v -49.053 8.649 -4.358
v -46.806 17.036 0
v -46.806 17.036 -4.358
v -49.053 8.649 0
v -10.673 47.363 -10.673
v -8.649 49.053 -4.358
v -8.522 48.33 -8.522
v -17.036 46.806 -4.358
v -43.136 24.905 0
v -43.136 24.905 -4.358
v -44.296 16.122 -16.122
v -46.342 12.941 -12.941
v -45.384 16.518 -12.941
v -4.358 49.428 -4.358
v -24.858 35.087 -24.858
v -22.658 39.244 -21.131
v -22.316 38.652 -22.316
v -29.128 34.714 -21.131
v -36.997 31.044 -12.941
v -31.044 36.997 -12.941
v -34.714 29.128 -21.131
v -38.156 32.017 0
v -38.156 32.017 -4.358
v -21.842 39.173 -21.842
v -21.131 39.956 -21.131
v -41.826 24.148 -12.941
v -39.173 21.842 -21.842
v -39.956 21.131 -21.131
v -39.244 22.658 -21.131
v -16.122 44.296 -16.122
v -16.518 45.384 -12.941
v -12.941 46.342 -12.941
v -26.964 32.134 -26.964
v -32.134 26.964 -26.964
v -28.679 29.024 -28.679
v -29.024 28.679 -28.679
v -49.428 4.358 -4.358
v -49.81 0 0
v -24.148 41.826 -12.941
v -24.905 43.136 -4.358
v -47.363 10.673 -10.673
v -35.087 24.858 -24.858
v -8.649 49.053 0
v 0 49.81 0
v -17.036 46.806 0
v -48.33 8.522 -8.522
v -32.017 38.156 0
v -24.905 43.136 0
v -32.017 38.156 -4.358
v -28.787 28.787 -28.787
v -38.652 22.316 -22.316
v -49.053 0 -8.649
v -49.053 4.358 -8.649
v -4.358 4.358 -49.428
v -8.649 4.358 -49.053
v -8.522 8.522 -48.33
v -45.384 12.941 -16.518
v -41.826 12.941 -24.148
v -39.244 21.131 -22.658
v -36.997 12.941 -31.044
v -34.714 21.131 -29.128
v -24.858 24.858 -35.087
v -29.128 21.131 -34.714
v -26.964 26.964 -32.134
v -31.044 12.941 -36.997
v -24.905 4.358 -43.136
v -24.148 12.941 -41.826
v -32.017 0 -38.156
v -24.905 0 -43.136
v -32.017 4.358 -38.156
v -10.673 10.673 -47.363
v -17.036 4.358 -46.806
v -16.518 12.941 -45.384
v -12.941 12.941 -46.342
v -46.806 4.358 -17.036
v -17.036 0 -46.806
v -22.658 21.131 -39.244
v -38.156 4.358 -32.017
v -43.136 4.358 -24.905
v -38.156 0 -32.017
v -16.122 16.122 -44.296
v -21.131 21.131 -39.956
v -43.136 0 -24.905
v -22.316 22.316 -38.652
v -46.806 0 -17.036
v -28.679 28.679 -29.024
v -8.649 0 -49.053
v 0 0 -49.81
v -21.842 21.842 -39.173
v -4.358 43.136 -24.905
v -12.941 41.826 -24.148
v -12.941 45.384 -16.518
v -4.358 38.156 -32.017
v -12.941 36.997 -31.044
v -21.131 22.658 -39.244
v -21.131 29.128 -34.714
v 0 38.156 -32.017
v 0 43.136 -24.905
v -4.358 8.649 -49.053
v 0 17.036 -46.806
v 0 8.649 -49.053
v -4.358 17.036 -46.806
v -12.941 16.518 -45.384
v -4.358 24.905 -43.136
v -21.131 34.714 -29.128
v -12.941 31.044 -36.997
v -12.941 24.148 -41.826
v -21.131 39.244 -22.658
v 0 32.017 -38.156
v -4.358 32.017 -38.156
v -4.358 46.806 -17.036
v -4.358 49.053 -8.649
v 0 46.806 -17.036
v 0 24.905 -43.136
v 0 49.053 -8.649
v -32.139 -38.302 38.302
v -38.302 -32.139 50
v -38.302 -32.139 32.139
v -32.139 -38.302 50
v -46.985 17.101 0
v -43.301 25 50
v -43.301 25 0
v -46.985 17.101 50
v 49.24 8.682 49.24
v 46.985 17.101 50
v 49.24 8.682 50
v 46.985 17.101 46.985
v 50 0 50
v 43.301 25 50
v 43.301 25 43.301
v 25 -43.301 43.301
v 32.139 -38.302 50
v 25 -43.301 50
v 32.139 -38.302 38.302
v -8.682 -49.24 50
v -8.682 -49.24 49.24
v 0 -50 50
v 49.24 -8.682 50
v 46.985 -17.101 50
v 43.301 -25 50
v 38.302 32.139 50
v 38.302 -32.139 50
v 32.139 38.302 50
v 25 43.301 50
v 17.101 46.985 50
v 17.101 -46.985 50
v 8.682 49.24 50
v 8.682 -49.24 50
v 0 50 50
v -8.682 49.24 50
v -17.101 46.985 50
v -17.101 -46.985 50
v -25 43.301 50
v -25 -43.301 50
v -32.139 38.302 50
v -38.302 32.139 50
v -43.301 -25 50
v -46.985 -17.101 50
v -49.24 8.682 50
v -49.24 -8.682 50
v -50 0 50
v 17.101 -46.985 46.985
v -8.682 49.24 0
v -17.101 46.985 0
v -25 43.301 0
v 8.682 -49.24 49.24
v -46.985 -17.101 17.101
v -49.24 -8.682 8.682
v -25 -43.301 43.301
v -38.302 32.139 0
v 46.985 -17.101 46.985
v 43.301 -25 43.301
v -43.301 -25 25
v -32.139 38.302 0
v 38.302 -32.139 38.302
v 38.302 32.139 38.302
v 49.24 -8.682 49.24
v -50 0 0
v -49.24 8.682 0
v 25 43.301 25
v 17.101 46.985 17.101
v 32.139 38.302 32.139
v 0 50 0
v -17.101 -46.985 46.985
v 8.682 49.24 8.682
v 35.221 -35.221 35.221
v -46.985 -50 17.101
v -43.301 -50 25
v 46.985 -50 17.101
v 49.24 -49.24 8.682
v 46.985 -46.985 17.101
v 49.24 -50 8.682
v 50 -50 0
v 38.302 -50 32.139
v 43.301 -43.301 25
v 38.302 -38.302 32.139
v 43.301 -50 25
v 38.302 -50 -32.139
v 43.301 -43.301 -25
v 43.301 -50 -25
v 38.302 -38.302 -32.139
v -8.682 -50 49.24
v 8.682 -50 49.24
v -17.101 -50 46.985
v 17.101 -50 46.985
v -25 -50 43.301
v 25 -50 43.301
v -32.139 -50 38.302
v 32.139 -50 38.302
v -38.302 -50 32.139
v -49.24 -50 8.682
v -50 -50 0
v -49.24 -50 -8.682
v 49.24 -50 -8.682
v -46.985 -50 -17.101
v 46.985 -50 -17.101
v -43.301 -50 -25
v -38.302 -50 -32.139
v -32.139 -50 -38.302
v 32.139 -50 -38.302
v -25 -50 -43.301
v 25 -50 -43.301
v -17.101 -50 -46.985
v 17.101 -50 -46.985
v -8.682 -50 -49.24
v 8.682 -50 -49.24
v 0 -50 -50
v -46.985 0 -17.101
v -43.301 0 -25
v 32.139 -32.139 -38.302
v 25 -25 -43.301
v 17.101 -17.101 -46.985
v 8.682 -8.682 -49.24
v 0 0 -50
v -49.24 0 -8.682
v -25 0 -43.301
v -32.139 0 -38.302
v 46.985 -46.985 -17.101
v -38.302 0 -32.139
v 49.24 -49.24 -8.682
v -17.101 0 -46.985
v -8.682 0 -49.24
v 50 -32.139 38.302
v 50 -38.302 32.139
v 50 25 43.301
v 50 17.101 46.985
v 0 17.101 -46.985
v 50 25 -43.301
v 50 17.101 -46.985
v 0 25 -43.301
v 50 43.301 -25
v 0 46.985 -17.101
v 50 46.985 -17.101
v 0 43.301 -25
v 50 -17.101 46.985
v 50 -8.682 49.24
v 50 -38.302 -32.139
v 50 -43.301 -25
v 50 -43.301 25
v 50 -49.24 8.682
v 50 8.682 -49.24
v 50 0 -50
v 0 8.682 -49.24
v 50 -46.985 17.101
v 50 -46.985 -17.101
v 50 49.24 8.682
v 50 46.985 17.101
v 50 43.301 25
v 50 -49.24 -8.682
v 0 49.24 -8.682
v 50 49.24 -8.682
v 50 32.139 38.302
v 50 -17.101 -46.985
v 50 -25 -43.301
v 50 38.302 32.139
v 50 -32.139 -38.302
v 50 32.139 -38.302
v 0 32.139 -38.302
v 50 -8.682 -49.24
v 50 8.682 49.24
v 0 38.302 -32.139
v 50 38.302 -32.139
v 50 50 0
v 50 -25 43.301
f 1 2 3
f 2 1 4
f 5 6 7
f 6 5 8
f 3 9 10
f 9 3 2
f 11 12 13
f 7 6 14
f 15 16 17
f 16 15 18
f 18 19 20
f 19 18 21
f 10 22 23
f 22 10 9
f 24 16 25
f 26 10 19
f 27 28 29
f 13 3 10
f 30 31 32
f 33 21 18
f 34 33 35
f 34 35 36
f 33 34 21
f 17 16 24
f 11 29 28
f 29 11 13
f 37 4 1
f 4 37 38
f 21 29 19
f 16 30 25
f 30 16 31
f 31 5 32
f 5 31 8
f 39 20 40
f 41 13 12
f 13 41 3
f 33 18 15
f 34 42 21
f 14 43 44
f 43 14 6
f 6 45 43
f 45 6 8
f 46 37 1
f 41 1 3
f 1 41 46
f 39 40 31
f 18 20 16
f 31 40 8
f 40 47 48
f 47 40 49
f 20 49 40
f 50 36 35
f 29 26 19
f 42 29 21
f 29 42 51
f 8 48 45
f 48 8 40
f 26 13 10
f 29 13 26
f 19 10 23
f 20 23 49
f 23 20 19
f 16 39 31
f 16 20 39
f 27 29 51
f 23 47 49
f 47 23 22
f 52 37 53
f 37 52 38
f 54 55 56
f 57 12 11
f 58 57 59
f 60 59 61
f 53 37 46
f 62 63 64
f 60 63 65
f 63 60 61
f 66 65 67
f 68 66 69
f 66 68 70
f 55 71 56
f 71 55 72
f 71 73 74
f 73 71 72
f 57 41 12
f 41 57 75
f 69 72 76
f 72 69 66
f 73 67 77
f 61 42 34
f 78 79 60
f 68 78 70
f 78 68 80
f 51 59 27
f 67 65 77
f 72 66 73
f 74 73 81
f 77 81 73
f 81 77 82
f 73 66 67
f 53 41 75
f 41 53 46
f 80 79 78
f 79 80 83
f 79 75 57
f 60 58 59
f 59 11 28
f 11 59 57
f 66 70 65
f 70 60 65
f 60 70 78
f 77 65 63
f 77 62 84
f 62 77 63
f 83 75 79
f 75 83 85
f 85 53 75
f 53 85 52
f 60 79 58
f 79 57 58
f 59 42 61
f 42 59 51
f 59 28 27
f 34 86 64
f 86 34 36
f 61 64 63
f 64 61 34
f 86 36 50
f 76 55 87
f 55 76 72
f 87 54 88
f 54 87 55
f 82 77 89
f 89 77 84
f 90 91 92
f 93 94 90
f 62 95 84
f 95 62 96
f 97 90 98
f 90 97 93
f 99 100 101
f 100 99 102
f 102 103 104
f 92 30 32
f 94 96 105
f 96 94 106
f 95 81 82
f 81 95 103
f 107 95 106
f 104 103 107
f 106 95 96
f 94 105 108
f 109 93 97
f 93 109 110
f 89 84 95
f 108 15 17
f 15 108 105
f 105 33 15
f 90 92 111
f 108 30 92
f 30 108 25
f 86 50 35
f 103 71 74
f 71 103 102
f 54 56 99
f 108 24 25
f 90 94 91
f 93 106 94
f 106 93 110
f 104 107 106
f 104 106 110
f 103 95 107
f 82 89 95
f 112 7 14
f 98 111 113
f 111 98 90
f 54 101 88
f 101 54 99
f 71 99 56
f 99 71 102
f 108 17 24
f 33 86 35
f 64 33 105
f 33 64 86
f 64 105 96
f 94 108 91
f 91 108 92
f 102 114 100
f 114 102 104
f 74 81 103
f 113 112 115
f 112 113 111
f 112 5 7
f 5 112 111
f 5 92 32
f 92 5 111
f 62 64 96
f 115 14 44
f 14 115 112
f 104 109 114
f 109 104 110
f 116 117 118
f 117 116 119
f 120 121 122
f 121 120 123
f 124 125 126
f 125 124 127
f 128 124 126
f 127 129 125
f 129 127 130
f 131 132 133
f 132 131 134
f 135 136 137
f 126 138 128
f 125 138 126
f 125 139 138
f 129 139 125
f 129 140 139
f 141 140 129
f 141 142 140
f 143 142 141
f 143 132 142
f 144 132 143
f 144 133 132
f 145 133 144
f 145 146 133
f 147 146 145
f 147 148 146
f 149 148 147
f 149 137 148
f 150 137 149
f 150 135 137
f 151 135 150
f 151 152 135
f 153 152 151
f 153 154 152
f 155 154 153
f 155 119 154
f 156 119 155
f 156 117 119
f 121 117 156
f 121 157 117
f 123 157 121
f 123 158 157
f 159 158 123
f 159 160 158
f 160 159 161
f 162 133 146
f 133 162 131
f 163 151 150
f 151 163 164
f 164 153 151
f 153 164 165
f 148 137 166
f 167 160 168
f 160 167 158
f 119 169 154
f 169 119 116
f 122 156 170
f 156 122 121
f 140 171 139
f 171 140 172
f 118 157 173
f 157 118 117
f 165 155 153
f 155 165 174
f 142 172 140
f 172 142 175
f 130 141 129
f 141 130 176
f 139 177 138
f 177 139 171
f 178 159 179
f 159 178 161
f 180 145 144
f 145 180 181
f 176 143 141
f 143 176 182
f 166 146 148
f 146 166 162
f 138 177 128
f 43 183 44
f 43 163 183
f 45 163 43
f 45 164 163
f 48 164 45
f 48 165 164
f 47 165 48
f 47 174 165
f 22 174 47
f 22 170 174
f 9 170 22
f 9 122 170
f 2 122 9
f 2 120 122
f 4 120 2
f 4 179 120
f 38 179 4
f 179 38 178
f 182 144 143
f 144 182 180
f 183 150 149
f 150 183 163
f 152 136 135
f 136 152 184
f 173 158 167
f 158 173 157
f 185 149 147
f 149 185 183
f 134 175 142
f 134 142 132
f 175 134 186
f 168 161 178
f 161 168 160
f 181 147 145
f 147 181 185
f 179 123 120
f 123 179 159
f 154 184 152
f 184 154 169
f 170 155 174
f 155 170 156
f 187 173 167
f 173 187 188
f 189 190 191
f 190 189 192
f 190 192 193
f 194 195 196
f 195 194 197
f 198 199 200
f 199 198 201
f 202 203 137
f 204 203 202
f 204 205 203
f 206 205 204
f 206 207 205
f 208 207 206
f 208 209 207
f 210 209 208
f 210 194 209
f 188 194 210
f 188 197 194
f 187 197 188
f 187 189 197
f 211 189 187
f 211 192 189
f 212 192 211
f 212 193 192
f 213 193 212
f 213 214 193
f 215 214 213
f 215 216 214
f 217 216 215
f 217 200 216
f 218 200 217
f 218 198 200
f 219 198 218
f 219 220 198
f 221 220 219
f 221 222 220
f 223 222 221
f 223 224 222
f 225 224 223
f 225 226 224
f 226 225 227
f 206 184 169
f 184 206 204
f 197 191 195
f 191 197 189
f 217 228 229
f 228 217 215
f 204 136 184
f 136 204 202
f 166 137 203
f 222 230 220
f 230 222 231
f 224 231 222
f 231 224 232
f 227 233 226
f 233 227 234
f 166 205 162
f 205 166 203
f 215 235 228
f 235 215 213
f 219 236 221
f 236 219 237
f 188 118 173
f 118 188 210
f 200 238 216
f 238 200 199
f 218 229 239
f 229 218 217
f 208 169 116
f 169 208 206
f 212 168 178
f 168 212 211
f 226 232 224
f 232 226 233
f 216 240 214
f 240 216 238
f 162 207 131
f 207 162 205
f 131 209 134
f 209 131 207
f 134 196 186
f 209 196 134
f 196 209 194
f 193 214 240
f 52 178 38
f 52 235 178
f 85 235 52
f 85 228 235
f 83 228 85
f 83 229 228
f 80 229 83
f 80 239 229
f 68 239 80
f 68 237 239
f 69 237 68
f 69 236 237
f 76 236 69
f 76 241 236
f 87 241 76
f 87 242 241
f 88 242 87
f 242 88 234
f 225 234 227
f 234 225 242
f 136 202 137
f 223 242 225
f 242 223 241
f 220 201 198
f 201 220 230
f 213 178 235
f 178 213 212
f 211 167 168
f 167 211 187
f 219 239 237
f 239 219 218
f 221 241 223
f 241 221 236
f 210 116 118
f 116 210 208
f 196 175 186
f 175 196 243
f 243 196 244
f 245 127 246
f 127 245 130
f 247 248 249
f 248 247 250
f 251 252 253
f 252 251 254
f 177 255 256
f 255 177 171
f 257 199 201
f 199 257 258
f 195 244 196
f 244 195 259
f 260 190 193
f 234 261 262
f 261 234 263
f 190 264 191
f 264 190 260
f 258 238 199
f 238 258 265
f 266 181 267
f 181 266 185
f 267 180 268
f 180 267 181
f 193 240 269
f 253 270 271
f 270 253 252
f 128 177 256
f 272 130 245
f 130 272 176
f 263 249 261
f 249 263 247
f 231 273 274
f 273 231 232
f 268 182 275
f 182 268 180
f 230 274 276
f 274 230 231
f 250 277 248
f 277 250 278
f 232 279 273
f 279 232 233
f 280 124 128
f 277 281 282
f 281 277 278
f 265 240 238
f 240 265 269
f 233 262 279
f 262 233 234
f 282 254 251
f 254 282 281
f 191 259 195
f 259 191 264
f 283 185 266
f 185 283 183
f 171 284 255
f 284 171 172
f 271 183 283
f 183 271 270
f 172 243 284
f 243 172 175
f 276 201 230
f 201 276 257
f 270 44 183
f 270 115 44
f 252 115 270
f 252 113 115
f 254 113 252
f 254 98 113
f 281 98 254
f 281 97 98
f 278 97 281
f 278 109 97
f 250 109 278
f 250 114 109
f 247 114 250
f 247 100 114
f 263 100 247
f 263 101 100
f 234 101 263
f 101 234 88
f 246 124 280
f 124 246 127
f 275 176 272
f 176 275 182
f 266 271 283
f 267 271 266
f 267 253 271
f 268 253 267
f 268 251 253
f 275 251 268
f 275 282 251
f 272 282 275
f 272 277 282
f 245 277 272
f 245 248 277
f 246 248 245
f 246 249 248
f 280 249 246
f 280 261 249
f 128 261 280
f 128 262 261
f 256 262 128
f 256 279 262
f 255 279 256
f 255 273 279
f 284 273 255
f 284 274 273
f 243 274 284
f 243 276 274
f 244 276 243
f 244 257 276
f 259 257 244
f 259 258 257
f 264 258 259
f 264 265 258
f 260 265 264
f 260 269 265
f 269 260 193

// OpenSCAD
/*
 * Copyright ©2015 Laurence Gonsalves <laurence@xenomachina.com>
 *
 * This library is free software; you can redistribute it and/or
 * modify it under the terms of the GNU Lesser General Public
 * License as published by the Free Software Foundation; either
 * version 2.1 of the License, or any later version.
 *
 * This library is distributed in the hope that it will be useful,
 * but WITHOUT ANY WARRANTY; without even the implied warranty of
 * MERCHANTABILITY or FITNESS FOR A PARTICULAR PURPOSE.  See the GNU
 * Lesser General Public License for more details.
 *
 * You should have received a copy of the GNU Lesser General Public
 * License along with this library; if not, write to:
 *   Free Software Foundation, Inc.
 *   51 Franklin Street, Fifth Floor
 *   Boston, MA  02110-1301
 *   USA
 */

$fn=36;
module octo_ball(r) {
    module chunk() {
        difference() {
            sphere(r);
            translate([0,0,+(r*sqrt(2))]) rotate([0,45,0]) cube(r*2, center=true);
            translate([0,0,-(r*sqrt(2))]) rotate([0,45,0]) cube(r*2, center=true);

            translate([0,0,+(r*sqrt(2))]) rotate([0,45,90]) cube(r*2, center=true);
            translate([0,0,-(r*sqrt(2))]) rotate([0,45,90]) cube(r*2, center=true);
        }
    }
    union() {
        rotate([90,0,0]) chunk();
        chunk();
        rotate([0,90,0]) chunk();
    }
}

// A little demo of octo_ball showing how the polys line up with axis-aligned
// cylinders 
union() {
    octo_ball(50);
    cylinder(h=50, r=50);
    rotate([90,0,0]) cylinder(h=50, r=50);
    rotate([0,90,0]) cylinder(h=50, r=50);
}
